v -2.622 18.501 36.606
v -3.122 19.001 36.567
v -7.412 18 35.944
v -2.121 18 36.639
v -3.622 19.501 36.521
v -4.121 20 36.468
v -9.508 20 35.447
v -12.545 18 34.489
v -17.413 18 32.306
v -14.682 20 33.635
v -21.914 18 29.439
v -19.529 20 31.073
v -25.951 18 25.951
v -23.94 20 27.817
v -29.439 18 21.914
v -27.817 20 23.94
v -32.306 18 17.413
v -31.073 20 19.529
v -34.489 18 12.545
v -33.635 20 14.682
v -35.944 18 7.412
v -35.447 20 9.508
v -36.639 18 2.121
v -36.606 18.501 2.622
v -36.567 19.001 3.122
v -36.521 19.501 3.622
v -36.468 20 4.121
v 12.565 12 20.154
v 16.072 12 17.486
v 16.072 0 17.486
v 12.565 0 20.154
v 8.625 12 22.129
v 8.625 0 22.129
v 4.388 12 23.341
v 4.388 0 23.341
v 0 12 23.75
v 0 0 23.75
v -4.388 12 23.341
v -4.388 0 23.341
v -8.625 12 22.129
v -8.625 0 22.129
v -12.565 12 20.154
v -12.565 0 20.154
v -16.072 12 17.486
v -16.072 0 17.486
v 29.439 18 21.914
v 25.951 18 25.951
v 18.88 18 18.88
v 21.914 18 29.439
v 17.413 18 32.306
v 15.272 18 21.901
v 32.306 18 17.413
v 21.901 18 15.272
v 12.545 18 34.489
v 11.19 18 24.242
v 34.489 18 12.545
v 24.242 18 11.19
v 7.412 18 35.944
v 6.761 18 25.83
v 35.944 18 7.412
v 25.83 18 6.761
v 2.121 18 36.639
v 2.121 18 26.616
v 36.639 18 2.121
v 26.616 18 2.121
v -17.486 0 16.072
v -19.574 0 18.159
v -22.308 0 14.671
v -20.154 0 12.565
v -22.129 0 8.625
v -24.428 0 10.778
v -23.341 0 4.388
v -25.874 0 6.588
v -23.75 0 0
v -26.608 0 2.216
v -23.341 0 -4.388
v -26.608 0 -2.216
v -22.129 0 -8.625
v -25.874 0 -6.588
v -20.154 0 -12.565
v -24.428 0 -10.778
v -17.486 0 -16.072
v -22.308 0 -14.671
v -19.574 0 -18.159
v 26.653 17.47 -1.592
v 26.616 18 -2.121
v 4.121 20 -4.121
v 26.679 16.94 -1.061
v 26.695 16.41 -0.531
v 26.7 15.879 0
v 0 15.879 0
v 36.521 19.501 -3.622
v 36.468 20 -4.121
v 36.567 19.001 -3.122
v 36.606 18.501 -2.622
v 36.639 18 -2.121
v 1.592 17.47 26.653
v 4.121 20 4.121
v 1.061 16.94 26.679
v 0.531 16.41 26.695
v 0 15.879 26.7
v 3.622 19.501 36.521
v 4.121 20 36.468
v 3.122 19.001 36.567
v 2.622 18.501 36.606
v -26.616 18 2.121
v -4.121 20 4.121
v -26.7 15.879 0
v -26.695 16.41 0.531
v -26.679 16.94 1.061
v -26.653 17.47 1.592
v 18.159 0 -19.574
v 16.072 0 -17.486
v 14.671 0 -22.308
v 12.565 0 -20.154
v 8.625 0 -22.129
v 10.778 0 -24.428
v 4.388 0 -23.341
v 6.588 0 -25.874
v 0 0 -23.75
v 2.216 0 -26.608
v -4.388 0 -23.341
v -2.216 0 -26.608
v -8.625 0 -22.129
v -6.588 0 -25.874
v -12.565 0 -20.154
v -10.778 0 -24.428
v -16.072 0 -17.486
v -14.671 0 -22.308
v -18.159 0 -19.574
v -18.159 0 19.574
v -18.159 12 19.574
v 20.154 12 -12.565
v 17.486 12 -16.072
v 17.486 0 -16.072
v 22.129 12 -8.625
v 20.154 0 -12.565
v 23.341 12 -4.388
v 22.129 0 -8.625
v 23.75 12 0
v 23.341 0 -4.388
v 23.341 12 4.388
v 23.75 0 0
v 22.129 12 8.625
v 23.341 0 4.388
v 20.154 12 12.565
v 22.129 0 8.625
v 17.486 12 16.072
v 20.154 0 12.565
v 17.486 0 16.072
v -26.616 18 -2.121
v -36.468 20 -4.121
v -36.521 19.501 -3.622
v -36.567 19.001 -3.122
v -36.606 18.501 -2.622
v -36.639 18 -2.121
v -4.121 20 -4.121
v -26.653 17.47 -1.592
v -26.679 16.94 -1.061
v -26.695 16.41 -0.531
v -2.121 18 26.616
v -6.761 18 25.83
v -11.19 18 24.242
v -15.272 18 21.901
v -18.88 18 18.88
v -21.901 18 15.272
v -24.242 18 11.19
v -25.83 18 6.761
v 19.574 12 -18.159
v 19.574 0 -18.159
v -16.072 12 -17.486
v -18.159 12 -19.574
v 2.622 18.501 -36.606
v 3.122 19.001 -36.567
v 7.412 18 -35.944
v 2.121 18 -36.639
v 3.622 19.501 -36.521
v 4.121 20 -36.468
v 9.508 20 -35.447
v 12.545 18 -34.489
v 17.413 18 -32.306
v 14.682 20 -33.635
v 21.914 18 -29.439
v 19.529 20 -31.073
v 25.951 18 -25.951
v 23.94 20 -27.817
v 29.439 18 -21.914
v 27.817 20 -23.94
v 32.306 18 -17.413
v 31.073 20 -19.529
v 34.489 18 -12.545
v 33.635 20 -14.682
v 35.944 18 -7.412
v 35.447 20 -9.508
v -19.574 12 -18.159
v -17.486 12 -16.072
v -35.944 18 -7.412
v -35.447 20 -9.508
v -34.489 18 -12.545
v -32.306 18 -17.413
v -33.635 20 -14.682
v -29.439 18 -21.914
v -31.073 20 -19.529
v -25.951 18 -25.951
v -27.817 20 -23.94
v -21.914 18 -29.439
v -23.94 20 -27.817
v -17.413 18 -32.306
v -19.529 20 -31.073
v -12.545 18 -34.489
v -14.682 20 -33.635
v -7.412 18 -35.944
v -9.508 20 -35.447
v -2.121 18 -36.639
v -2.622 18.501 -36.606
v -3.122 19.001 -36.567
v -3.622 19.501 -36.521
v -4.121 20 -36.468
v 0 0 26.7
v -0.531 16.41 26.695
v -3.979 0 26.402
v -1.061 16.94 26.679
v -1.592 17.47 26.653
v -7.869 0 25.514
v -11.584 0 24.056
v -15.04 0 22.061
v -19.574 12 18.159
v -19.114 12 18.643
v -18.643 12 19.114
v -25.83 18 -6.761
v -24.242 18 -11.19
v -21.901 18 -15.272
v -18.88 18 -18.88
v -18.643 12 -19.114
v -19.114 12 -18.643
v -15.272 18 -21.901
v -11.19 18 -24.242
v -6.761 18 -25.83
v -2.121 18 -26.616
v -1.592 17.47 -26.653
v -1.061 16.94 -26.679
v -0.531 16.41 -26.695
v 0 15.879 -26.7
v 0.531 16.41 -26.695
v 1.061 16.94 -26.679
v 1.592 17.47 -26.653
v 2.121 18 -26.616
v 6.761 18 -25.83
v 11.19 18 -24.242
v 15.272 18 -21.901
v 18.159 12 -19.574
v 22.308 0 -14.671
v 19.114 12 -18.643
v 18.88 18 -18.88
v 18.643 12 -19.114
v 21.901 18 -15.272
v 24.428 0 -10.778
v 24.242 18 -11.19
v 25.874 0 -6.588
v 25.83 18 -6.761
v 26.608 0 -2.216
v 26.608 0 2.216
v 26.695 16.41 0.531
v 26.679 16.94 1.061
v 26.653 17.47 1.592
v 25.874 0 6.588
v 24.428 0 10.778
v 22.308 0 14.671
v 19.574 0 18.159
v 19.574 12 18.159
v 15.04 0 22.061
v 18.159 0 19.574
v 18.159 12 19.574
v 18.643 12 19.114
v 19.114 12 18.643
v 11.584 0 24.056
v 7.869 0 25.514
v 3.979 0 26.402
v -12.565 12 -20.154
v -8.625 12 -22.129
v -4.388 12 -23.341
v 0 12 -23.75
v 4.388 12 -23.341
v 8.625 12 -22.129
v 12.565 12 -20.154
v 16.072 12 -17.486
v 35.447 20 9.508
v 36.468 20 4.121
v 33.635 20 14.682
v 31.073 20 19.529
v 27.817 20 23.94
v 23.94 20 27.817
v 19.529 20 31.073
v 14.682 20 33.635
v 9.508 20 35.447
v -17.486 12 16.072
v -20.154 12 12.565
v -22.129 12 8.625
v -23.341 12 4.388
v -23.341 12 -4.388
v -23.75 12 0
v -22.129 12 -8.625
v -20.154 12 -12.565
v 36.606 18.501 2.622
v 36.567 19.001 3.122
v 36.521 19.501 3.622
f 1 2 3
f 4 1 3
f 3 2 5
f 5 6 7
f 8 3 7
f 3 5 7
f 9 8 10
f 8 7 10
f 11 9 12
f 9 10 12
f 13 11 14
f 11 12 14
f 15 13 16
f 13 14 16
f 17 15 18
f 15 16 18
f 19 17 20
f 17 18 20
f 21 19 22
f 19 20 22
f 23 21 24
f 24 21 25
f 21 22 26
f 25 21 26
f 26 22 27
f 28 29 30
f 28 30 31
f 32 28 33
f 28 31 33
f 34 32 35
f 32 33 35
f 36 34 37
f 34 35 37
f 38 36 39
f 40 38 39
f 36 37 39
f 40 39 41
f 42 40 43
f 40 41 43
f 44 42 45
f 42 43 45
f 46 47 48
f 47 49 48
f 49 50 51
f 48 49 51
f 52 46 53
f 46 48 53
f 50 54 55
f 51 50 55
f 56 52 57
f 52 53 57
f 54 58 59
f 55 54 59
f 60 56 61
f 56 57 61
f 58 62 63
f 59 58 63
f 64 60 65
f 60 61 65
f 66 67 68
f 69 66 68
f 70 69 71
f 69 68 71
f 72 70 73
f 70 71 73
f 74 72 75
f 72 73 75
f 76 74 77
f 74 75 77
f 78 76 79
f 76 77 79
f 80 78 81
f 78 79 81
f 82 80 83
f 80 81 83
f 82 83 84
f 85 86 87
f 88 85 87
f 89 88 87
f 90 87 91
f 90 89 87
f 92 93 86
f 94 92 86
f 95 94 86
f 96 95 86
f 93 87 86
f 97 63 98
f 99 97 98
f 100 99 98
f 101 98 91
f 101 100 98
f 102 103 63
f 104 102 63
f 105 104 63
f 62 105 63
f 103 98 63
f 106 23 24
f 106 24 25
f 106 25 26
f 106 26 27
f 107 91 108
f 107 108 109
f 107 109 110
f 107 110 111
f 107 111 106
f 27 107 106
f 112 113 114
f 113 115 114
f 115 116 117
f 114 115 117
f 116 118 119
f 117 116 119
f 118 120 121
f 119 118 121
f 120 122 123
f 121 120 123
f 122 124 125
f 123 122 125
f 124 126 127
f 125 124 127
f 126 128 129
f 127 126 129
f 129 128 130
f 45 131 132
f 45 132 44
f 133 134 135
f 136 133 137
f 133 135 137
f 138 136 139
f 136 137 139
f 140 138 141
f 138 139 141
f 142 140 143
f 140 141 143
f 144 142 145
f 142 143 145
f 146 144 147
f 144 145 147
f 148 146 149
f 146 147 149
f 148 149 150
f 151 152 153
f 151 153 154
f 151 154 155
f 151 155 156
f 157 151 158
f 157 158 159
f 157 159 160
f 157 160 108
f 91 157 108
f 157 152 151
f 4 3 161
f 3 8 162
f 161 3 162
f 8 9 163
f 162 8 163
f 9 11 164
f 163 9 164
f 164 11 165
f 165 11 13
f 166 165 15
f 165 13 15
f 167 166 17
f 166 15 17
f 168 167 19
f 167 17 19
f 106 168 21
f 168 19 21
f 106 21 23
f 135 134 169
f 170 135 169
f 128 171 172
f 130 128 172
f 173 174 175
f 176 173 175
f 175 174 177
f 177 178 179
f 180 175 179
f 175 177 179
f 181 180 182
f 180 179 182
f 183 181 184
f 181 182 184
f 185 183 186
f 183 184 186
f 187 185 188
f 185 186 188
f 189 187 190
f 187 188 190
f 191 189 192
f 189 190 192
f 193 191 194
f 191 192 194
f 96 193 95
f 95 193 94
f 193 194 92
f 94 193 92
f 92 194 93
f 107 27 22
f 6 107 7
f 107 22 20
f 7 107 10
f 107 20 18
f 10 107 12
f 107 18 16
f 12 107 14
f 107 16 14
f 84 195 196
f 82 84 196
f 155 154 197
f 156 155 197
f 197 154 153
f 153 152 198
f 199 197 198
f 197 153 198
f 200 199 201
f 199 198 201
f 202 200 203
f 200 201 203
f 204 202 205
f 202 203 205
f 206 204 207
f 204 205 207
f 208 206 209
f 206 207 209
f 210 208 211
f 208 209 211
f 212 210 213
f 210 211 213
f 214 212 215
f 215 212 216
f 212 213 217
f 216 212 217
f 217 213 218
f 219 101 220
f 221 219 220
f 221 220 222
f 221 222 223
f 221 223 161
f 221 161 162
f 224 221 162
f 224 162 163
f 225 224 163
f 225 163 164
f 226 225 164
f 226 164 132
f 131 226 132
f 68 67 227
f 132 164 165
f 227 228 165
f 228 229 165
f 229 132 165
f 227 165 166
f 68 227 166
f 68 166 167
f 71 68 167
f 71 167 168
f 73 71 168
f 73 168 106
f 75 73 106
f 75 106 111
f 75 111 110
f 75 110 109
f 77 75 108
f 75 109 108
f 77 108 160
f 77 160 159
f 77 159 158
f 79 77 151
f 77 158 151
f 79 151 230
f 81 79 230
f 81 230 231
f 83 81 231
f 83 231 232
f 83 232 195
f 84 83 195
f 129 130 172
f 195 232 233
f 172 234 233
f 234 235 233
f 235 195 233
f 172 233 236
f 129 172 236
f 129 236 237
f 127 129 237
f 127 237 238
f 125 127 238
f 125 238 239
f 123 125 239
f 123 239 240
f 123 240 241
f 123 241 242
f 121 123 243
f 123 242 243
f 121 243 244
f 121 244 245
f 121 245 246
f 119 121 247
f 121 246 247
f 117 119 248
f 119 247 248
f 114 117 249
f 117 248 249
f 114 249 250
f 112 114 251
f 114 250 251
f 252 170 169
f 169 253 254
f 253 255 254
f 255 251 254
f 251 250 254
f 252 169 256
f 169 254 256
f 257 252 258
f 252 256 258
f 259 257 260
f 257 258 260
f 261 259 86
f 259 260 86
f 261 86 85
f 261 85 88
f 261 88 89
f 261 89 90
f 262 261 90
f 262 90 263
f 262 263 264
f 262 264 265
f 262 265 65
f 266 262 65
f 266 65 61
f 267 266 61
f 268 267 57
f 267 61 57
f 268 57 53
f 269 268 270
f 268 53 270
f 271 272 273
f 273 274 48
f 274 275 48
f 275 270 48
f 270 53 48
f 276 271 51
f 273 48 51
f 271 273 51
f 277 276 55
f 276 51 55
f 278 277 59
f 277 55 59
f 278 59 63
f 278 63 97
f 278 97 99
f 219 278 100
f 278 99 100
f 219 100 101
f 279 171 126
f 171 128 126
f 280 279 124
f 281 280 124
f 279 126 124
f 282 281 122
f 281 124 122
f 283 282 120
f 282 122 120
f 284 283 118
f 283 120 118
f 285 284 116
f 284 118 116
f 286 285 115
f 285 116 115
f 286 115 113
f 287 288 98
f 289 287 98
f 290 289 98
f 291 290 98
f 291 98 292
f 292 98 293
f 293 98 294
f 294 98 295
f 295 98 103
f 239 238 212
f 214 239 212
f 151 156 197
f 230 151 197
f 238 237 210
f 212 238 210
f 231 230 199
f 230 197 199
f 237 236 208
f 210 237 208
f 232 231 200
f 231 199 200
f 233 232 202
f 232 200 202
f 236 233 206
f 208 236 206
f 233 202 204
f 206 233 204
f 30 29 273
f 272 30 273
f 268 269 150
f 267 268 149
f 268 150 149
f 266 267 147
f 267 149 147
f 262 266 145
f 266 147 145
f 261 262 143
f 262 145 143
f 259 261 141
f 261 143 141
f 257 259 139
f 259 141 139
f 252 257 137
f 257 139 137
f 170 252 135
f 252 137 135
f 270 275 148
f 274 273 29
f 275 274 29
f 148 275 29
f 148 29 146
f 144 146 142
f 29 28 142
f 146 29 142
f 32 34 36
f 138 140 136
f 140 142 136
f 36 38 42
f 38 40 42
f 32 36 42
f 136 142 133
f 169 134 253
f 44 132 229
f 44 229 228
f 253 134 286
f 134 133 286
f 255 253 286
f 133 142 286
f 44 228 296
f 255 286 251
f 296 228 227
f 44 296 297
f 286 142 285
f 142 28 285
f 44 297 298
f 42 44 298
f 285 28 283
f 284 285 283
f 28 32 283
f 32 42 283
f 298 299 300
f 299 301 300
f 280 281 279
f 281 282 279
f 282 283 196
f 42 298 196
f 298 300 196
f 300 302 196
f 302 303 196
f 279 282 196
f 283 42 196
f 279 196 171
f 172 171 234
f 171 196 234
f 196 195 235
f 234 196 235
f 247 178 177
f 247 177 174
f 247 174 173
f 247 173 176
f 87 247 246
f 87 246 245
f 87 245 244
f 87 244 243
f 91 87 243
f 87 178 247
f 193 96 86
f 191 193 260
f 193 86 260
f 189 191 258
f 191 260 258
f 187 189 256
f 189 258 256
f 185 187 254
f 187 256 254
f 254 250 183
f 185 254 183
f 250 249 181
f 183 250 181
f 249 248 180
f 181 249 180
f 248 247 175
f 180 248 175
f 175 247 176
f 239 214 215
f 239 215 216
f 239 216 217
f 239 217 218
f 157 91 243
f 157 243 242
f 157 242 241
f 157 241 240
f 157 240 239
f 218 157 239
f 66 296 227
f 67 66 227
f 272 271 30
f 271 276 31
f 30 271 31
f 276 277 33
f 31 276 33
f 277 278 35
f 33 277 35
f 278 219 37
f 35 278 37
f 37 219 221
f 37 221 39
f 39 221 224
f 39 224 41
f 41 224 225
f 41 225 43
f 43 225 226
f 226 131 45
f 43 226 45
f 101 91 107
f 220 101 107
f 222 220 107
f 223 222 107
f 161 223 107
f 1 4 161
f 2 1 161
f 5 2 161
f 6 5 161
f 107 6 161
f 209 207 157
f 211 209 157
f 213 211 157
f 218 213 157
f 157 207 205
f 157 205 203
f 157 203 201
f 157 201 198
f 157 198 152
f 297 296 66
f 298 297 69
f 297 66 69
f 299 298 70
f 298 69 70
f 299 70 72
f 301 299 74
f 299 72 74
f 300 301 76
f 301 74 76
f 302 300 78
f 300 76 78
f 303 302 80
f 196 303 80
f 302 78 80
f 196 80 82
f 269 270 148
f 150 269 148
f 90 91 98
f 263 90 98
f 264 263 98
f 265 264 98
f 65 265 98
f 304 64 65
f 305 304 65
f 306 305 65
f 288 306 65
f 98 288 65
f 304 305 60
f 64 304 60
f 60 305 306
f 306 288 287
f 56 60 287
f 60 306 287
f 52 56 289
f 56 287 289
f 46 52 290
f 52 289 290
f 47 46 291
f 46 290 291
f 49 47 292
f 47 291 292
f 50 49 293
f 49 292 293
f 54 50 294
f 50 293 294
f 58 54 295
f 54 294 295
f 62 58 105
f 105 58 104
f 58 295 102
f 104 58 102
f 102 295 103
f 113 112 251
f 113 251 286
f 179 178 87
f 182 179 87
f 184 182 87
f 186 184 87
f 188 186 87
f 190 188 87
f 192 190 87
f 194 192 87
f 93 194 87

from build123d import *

# Parameters (mm, degrees)
CUT_EXTRUDE1_DEPTH = 56.621758333
CIRPATTERN1_COUNT  = 4
SKETCH3_R          = 23.75
CUT_EXTRUDE2_DEPTH = 12
CUT_EXTRUDE3_START = 12
CUT_EXTRUDE3_DEPTH = 12
CIRPATTERN2_COUNT  = 4


with BuildPart() as part:
    # Sketch1 → Revolve1 (revolve)
    with BuildSketch(Plane(origin=(0, 0, 0), x_dir=(0, 0, -1), z_dir=(1, 0, 0)), mode=Mode.PRIVATE) as revolve1_sk:
        Polygon((0, 0), (26.7, 0), (26.7, 18), (36.7, 18), (36.7, 20), (0, 20), align=None)
    revolve(revolve1_sk.sketch.rotate(Axis((0, 20, 0), (0, -1, 0)), 180), axis=Axis((0, 20, 0), (0, -1, 0)))

    # Sketch2 → Cut-Extrude1 (cut, symmetric)
    with BuildSketch(Plane.XY):
        Polygon((4.121320344, 20), (0, 15.878679656), (-4.121320344, 20), align=None)
    cut_extrude1 = extrude(amount=CUT_EXTRUDE1_DEPTH, both=True, mode=Mode.SUBTRACT)

    # CirPattern1: Cut-Extrude1 ×4 about axis
    cirpattern1_axis = Axis((0, 0, 0), (0, 1, 0))
    for i in range(1, CIRPATTERN1_COUNT):
        add(cut_extrude1.rotate(cirpattern1_axis, i * 360 / CIRPATTERN1_COUNT), mode=Mode.SUBTRACT)

    # Sketch3 → Cut-Extrude2 (cut)
    with BuildSketch(Plane.XZ):
        with Locations(Location((0, 0, 0), (0, 0, 270))):
            Circle(SKETCH3_R)
    extrude(amount=-CUT_EXTRUDE2_DEPTH, mode=Mode.SUBTRACT)

    # Sketch4 → Cut-Extrude3 (cut)
    with BuildSketch(Plane(origin=(0, 0, 0), x_dir=(1, 0, 0), z_dir=(0, 1, 0)).offset(CUT_EXTRUDE3_START)):
        with BuildLine():
            Line((-25.234076692, -26.648290255), (0, -1.414213562))
            Line((0, -1.414213562), (-1.414213562, 0))
            Line((-1.414213562, 0), (-26.648290255, -25.234076692))
            ThreePointArc((-26.648290255, -25.234076692), (-25.95081887, -25.95081887), (-25.234076692, -26.648290255))
        make_face()
    cut_extrude3 = extrude(amount=-CUT_EXTRUDE3_DEPTH, mode=Mode.SUBTRACT)

    # CirPattern2: Cut-Extrude3 ×4 about axis
    cirpattern2_axis = Axis((0, 0, 0), (0, 1, 0))
    for i in range(1, CIRPATTERN2_COUNT):
        add(cut_extrude3.rotate(cirpattern2_axis, i * 360 / CIRPATTERN2_COUNT), mode=Mode.SUBTRACT)


solid = part.part
